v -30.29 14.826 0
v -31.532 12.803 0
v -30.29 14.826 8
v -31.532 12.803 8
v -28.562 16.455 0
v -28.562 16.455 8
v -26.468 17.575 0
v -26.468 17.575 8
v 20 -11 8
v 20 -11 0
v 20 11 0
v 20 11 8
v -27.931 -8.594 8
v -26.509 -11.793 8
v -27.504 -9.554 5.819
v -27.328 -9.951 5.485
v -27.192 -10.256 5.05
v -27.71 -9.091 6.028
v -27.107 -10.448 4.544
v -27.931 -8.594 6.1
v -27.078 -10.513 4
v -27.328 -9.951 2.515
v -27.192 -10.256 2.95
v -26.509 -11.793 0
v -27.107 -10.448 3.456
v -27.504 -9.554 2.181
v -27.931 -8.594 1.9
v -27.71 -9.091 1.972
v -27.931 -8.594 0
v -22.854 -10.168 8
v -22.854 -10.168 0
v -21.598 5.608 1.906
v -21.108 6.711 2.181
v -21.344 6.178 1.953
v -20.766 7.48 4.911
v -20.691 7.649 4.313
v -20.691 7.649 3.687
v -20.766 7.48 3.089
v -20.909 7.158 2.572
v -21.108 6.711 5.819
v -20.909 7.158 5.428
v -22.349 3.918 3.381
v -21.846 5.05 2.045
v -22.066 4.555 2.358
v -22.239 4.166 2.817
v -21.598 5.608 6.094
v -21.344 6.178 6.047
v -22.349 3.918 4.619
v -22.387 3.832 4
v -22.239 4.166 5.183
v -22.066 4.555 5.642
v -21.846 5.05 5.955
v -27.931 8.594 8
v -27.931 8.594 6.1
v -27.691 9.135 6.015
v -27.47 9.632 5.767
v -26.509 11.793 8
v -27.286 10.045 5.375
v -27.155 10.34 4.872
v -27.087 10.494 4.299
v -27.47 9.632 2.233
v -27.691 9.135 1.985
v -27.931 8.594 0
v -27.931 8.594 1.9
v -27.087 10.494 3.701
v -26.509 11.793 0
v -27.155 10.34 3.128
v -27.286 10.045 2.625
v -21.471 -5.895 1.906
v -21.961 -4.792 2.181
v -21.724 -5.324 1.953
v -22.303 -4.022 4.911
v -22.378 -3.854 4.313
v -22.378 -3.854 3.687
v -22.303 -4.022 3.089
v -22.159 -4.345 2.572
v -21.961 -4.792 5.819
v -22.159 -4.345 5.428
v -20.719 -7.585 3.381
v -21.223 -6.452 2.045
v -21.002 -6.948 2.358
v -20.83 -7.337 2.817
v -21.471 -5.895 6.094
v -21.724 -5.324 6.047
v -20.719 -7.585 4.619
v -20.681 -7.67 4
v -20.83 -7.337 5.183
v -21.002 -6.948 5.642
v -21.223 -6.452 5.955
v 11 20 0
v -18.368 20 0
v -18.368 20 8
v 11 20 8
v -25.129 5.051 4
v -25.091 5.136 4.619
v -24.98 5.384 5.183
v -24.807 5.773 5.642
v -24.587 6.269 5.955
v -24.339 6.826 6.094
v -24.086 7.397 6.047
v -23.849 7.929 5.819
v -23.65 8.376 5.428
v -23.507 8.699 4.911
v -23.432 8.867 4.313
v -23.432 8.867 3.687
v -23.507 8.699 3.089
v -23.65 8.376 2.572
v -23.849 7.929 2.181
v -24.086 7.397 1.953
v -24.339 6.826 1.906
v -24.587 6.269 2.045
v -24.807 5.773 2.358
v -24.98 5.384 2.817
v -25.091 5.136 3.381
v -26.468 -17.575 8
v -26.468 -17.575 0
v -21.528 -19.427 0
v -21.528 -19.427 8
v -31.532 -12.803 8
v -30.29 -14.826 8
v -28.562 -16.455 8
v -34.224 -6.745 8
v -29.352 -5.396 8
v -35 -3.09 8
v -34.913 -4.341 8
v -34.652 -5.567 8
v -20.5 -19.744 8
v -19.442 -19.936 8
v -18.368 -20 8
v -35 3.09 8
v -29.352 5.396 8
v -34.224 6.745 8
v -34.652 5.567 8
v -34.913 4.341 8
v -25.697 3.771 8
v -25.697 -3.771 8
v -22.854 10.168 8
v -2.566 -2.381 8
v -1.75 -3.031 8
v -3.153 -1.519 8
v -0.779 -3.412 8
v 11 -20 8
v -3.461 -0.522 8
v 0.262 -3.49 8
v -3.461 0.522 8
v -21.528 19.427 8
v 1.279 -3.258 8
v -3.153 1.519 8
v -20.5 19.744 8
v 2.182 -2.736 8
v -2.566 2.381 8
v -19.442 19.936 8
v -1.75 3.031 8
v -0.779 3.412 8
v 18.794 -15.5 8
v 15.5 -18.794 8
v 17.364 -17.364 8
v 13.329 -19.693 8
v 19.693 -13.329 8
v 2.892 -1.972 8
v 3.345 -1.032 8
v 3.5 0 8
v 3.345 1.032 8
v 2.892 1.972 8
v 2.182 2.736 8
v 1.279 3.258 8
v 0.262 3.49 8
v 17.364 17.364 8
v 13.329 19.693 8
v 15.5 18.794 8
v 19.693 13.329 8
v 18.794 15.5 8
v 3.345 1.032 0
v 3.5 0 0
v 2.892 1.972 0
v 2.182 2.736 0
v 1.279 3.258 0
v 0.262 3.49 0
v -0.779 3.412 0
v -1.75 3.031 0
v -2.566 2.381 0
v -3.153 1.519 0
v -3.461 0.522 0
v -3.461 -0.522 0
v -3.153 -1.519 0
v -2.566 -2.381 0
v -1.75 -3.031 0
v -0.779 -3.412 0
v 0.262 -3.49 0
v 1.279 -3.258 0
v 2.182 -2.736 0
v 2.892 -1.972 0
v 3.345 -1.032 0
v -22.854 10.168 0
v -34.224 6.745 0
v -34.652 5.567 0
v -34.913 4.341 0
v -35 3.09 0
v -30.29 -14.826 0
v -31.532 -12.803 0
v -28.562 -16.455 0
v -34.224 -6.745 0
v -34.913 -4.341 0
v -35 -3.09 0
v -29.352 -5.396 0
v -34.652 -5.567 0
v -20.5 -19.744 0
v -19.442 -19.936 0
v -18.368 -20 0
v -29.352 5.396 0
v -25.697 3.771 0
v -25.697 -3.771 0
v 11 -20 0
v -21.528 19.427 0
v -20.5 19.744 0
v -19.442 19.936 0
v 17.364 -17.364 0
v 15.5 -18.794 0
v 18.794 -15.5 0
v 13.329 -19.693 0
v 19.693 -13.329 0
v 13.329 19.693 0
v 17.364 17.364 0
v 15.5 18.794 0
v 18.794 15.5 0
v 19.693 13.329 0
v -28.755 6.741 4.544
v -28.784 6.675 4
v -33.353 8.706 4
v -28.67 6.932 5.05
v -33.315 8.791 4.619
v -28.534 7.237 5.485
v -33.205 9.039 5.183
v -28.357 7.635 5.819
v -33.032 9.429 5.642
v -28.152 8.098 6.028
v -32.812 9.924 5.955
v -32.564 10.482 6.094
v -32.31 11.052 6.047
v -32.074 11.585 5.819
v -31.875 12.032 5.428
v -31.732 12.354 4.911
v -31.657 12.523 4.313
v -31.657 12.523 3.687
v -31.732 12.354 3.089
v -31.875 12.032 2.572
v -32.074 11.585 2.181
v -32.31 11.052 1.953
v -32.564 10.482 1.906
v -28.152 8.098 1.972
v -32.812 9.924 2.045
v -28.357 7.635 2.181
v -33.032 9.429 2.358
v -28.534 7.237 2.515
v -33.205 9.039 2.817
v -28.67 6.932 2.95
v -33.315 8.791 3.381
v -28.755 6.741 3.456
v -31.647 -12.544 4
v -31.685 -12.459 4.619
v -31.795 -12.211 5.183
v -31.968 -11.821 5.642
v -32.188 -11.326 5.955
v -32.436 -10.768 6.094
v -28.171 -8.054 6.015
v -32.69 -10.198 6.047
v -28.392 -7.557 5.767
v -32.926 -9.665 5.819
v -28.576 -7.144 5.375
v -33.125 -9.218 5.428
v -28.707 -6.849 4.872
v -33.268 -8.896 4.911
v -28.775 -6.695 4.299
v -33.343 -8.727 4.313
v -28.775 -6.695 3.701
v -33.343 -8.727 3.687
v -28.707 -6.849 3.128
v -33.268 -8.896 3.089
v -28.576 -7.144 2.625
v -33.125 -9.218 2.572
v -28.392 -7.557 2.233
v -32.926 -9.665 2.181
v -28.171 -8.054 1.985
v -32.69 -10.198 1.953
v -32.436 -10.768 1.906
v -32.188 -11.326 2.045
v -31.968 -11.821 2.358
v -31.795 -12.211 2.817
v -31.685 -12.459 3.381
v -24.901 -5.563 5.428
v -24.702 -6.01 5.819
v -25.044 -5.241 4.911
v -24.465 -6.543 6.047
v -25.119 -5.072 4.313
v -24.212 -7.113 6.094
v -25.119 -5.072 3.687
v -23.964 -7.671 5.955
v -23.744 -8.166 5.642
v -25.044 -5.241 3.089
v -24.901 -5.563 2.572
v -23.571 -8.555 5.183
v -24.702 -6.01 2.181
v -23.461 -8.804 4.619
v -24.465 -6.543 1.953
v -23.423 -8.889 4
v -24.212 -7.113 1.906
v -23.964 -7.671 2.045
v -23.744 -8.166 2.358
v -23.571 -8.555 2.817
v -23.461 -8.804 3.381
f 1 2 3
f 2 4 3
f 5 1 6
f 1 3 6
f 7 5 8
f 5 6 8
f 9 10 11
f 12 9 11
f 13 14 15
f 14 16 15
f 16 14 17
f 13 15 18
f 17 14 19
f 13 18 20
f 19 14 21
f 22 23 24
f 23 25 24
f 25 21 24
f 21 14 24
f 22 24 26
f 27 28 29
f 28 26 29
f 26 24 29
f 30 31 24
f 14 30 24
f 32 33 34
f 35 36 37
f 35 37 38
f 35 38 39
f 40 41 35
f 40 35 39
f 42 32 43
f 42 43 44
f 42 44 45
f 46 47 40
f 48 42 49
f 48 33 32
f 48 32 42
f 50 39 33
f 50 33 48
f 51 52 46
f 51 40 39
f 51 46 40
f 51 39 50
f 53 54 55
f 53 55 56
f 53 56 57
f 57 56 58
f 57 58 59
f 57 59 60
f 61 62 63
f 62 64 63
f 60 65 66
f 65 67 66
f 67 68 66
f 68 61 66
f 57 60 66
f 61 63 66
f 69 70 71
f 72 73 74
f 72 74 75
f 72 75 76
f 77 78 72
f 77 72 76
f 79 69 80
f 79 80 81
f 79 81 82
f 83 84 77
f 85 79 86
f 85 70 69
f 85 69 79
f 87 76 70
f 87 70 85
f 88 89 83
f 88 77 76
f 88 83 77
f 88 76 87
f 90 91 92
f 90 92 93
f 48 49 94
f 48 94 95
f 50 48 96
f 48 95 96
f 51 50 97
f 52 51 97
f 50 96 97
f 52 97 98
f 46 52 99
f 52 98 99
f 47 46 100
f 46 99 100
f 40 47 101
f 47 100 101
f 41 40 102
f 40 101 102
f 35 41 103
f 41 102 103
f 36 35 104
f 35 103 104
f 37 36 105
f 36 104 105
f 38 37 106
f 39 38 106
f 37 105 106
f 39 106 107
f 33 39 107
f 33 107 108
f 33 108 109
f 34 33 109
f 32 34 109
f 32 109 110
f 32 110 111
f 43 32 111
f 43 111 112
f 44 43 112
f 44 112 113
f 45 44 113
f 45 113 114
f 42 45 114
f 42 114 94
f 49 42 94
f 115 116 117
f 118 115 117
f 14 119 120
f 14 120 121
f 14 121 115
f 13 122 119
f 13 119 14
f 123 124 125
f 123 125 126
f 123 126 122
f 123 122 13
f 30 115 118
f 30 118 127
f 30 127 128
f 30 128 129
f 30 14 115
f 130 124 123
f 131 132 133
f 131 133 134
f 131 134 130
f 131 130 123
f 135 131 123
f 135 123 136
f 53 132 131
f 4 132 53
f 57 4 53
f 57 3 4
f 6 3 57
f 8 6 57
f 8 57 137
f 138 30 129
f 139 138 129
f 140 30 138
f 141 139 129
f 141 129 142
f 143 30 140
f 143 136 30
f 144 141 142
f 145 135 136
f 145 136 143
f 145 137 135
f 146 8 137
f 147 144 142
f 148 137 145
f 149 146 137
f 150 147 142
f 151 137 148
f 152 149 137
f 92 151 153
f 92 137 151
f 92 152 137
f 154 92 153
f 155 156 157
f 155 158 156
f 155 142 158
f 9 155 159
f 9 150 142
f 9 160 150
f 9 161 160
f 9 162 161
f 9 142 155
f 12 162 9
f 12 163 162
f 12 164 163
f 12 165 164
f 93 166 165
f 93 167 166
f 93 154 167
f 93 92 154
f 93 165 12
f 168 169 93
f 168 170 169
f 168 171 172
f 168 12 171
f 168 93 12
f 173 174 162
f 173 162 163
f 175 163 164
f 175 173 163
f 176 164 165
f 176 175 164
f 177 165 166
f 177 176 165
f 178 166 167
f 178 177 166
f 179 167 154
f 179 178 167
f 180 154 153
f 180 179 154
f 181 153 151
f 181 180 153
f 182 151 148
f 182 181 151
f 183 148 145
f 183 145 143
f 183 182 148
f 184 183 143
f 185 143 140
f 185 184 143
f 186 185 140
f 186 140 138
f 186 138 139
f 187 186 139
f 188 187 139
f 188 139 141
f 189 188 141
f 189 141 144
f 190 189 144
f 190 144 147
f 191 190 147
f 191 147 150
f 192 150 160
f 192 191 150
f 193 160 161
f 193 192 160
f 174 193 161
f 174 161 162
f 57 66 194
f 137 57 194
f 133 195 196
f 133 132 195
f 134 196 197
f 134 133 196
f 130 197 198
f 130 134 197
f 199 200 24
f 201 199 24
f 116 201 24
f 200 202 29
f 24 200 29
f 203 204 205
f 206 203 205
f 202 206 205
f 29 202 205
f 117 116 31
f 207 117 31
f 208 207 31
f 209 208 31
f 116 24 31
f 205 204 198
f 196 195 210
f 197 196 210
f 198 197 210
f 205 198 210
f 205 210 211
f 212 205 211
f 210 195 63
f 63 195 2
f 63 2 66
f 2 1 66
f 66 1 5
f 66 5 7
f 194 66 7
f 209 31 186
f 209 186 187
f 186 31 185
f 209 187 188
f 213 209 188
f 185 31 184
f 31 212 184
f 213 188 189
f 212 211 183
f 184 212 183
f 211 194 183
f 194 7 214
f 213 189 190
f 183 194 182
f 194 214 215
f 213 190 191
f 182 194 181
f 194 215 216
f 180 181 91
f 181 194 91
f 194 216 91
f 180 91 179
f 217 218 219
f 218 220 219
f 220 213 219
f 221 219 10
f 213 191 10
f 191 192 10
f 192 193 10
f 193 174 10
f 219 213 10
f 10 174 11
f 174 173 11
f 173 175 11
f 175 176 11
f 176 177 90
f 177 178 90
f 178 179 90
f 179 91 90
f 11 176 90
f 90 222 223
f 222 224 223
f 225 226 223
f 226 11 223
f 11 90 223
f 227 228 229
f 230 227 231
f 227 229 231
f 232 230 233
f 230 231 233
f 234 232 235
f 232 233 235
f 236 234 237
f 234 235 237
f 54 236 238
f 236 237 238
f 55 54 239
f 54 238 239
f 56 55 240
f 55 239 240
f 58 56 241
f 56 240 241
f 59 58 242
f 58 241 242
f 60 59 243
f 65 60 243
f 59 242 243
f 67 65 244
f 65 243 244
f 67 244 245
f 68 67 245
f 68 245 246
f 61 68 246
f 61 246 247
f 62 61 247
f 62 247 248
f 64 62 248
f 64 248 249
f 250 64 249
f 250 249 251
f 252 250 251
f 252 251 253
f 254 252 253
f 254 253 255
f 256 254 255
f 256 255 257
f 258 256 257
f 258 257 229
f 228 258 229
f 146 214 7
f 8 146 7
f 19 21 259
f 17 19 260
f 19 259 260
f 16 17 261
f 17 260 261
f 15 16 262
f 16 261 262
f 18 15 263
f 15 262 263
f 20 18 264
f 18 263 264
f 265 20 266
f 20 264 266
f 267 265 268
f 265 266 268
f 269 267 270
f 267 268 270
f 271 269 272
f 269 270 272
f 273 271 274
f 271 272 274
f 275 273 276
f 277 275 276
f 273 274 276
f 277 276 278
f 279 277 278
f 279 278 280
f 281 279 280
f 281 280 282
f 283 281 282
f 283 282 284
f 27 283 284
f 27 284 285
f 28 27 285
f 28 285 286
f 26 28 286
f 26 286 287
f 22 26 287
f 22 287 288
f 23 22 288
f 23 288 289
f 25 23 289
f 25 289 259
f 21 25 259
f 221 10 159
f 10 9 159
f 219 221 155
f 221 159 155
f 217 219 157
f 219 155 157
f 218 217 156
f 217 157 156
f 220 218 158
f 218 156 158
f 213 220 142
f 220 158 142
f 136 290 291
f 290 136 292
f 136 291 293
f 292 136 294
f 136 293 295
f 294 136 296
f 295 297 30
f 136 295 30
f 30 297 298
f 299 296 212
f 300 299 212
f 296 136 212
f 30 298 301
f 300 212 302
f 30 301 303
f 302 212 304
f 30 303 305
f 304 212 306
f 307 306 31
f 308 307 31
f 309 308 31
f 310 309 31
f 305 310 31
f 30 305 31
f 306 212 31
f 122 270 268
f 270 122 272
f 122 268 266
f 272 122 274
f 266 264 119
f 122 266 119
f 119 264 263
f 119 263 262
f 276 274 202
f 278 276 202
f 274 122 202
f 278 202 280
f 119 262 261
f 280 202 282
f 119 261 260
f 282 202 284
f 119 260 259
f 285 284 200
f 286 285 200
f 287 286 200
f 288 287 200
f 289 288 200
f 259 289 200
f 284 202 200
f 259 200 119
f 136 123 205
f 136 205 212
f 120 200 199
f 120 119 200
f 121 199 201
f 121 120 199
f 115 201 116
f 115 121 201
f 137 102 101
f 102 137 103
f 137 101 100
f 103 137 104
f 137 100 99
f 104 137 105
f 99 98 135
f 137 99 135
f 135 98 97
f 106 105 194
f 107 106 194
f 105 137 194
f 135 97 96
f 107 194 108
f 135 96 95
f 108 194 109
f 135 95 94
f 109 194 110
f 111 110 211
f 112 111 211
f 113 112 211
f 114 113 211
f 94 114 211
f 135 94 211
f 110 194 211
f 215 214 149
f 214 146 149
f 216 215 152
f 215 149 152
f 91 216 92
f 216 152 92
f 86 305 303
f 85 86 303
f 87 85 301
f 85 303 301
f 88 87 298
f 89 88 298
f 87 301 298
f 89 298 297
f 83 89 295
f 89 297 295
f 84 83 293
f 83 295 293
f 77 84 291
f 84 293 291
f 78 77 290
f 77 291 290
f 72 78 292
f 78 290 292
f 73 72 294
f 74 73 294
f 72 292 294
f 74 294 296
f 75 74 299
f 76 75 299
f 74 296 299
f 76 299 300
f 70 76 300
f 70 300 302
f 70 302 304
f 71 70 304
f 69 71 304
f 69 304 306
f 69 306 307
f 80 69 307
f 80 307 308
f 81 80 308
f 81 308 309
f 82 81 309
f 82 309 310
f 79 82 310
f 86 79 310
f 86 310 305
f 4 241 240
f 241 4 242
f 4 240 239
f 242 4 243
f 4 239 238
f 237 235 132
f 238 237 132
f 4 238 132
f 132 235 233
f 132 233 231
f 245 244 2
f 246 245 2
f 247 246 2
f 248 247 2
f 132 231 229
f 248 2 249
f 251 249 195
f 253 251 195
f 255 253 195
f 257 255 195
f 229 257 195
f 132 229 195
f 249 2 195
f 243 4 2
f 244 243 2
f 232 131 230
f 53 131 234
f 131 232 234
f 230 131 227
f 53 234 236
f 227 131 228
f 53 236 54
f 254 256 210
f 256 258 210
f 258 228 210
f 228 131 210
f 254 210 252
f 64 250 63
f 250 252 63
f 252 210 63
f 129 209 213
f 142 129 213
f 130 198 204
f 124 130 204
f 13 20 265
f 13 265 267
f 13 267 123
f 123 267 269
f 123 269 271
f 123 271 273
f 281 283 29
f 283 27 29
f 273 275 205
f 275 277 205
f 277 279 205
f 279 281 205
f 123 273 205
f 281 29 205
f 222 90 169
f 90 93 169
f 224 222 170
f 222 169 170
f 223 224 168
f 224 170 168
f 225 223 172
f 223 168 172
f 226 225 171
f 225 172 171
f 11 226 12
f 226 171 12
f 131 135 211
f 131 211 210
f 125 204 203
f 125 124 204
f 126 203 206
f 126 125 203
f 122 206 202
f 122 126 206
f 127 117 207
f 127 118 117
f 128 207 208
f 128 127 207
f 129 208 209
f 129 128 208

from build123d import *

# Parameters (mm, degrees)
F0_W     = 40
F0_H     = 40
F0_R     = 3.5
F1_DEPTH = 8
F2_R     = 2.1
F3_DEPTH = 12
F4_R     = 2.1
F5_DEPTH = 12
F6_R     = 9


with BuildPart() as f1:
    # F0 (on Top) → F1 (new body)
    with BuildSketch(Plane.XY):
        Polygon((-30, 0), (-30, 16.25), (-35, 5), (-35, 0), (-35, -5), (-30, -16.25), align=None)
        Polygon((-20, -20), (-20, 20), (-30, 16.25), (-30, 0), (-30, -16.25), align=None)
        Polygon((-26.5094576257, -11.7926480899), (-27.9309422569, -8.5943076697), (-29.3524268881, -5.3959672496), (-25.6971806936, -3.7714133853), (-22.8542114312, -10.1680942257), align=None, mode=Mode.SUBTRACT)
        Polygon((-29.3524268881, 5.3959672496), (-27.9309422569, 8.5943076697), (-26.5094576257, 11.7926480899), (-22.8542114312, 10.1680942257), (-25.6971806936, 3.7714133853), align=None, mode=Mode.SUBTRACT)
        Rectangle(F0_W, F0_H)
        Circle(F0_R, mode=Mode.SUBTRACT)
    extrude(amount=F1_DEPTH)

    # F2 (on face) → F3 (cut)
    with BuildSketch(Plane(origin=(-31.0824742268, 13.8144329897, 0), x_dir=(-0.4061384661, -0.9138115486, 0), z_dir=(-0.9138115486, 0.4061384661, 0))):
        with Locations((3.4902524426, 4)):
            Circle(F2_R)
    extrude(amount=-F3_DEPTH, mode=Mode.SUBTRACT)

    # F4 (on face) → F5 (cut)
    with BuildSketch(Plane(origin=(-31.0824742268, -13.8144329897, 0), x_dir=(0.4061384661, -0.9138115486, 0), z_dir=(-0.9138115486, -0.4061384661, 0))):
        with Locations((-3.4902524426, 4)):
            Circle(F4_R)
    extrude(amount=-F5_DEPTH, mode=Mode.SUBTRACT)

    # F6
    f6_edges = [f1.edges().sort_by_distance(p)[0] for p in [
        (20, -20, 4),
        (20, 20, 4),
        (-20, -20, 4),
        (-30, -16.25, 4),
        (-35, -5, 4),
        (-35, 5, 4),
        (-30, 16.25, 4),
        (-20, 20, 4),
    ]]
    fillet(f6_edges, radius=F6_R)


solid = f1.part
